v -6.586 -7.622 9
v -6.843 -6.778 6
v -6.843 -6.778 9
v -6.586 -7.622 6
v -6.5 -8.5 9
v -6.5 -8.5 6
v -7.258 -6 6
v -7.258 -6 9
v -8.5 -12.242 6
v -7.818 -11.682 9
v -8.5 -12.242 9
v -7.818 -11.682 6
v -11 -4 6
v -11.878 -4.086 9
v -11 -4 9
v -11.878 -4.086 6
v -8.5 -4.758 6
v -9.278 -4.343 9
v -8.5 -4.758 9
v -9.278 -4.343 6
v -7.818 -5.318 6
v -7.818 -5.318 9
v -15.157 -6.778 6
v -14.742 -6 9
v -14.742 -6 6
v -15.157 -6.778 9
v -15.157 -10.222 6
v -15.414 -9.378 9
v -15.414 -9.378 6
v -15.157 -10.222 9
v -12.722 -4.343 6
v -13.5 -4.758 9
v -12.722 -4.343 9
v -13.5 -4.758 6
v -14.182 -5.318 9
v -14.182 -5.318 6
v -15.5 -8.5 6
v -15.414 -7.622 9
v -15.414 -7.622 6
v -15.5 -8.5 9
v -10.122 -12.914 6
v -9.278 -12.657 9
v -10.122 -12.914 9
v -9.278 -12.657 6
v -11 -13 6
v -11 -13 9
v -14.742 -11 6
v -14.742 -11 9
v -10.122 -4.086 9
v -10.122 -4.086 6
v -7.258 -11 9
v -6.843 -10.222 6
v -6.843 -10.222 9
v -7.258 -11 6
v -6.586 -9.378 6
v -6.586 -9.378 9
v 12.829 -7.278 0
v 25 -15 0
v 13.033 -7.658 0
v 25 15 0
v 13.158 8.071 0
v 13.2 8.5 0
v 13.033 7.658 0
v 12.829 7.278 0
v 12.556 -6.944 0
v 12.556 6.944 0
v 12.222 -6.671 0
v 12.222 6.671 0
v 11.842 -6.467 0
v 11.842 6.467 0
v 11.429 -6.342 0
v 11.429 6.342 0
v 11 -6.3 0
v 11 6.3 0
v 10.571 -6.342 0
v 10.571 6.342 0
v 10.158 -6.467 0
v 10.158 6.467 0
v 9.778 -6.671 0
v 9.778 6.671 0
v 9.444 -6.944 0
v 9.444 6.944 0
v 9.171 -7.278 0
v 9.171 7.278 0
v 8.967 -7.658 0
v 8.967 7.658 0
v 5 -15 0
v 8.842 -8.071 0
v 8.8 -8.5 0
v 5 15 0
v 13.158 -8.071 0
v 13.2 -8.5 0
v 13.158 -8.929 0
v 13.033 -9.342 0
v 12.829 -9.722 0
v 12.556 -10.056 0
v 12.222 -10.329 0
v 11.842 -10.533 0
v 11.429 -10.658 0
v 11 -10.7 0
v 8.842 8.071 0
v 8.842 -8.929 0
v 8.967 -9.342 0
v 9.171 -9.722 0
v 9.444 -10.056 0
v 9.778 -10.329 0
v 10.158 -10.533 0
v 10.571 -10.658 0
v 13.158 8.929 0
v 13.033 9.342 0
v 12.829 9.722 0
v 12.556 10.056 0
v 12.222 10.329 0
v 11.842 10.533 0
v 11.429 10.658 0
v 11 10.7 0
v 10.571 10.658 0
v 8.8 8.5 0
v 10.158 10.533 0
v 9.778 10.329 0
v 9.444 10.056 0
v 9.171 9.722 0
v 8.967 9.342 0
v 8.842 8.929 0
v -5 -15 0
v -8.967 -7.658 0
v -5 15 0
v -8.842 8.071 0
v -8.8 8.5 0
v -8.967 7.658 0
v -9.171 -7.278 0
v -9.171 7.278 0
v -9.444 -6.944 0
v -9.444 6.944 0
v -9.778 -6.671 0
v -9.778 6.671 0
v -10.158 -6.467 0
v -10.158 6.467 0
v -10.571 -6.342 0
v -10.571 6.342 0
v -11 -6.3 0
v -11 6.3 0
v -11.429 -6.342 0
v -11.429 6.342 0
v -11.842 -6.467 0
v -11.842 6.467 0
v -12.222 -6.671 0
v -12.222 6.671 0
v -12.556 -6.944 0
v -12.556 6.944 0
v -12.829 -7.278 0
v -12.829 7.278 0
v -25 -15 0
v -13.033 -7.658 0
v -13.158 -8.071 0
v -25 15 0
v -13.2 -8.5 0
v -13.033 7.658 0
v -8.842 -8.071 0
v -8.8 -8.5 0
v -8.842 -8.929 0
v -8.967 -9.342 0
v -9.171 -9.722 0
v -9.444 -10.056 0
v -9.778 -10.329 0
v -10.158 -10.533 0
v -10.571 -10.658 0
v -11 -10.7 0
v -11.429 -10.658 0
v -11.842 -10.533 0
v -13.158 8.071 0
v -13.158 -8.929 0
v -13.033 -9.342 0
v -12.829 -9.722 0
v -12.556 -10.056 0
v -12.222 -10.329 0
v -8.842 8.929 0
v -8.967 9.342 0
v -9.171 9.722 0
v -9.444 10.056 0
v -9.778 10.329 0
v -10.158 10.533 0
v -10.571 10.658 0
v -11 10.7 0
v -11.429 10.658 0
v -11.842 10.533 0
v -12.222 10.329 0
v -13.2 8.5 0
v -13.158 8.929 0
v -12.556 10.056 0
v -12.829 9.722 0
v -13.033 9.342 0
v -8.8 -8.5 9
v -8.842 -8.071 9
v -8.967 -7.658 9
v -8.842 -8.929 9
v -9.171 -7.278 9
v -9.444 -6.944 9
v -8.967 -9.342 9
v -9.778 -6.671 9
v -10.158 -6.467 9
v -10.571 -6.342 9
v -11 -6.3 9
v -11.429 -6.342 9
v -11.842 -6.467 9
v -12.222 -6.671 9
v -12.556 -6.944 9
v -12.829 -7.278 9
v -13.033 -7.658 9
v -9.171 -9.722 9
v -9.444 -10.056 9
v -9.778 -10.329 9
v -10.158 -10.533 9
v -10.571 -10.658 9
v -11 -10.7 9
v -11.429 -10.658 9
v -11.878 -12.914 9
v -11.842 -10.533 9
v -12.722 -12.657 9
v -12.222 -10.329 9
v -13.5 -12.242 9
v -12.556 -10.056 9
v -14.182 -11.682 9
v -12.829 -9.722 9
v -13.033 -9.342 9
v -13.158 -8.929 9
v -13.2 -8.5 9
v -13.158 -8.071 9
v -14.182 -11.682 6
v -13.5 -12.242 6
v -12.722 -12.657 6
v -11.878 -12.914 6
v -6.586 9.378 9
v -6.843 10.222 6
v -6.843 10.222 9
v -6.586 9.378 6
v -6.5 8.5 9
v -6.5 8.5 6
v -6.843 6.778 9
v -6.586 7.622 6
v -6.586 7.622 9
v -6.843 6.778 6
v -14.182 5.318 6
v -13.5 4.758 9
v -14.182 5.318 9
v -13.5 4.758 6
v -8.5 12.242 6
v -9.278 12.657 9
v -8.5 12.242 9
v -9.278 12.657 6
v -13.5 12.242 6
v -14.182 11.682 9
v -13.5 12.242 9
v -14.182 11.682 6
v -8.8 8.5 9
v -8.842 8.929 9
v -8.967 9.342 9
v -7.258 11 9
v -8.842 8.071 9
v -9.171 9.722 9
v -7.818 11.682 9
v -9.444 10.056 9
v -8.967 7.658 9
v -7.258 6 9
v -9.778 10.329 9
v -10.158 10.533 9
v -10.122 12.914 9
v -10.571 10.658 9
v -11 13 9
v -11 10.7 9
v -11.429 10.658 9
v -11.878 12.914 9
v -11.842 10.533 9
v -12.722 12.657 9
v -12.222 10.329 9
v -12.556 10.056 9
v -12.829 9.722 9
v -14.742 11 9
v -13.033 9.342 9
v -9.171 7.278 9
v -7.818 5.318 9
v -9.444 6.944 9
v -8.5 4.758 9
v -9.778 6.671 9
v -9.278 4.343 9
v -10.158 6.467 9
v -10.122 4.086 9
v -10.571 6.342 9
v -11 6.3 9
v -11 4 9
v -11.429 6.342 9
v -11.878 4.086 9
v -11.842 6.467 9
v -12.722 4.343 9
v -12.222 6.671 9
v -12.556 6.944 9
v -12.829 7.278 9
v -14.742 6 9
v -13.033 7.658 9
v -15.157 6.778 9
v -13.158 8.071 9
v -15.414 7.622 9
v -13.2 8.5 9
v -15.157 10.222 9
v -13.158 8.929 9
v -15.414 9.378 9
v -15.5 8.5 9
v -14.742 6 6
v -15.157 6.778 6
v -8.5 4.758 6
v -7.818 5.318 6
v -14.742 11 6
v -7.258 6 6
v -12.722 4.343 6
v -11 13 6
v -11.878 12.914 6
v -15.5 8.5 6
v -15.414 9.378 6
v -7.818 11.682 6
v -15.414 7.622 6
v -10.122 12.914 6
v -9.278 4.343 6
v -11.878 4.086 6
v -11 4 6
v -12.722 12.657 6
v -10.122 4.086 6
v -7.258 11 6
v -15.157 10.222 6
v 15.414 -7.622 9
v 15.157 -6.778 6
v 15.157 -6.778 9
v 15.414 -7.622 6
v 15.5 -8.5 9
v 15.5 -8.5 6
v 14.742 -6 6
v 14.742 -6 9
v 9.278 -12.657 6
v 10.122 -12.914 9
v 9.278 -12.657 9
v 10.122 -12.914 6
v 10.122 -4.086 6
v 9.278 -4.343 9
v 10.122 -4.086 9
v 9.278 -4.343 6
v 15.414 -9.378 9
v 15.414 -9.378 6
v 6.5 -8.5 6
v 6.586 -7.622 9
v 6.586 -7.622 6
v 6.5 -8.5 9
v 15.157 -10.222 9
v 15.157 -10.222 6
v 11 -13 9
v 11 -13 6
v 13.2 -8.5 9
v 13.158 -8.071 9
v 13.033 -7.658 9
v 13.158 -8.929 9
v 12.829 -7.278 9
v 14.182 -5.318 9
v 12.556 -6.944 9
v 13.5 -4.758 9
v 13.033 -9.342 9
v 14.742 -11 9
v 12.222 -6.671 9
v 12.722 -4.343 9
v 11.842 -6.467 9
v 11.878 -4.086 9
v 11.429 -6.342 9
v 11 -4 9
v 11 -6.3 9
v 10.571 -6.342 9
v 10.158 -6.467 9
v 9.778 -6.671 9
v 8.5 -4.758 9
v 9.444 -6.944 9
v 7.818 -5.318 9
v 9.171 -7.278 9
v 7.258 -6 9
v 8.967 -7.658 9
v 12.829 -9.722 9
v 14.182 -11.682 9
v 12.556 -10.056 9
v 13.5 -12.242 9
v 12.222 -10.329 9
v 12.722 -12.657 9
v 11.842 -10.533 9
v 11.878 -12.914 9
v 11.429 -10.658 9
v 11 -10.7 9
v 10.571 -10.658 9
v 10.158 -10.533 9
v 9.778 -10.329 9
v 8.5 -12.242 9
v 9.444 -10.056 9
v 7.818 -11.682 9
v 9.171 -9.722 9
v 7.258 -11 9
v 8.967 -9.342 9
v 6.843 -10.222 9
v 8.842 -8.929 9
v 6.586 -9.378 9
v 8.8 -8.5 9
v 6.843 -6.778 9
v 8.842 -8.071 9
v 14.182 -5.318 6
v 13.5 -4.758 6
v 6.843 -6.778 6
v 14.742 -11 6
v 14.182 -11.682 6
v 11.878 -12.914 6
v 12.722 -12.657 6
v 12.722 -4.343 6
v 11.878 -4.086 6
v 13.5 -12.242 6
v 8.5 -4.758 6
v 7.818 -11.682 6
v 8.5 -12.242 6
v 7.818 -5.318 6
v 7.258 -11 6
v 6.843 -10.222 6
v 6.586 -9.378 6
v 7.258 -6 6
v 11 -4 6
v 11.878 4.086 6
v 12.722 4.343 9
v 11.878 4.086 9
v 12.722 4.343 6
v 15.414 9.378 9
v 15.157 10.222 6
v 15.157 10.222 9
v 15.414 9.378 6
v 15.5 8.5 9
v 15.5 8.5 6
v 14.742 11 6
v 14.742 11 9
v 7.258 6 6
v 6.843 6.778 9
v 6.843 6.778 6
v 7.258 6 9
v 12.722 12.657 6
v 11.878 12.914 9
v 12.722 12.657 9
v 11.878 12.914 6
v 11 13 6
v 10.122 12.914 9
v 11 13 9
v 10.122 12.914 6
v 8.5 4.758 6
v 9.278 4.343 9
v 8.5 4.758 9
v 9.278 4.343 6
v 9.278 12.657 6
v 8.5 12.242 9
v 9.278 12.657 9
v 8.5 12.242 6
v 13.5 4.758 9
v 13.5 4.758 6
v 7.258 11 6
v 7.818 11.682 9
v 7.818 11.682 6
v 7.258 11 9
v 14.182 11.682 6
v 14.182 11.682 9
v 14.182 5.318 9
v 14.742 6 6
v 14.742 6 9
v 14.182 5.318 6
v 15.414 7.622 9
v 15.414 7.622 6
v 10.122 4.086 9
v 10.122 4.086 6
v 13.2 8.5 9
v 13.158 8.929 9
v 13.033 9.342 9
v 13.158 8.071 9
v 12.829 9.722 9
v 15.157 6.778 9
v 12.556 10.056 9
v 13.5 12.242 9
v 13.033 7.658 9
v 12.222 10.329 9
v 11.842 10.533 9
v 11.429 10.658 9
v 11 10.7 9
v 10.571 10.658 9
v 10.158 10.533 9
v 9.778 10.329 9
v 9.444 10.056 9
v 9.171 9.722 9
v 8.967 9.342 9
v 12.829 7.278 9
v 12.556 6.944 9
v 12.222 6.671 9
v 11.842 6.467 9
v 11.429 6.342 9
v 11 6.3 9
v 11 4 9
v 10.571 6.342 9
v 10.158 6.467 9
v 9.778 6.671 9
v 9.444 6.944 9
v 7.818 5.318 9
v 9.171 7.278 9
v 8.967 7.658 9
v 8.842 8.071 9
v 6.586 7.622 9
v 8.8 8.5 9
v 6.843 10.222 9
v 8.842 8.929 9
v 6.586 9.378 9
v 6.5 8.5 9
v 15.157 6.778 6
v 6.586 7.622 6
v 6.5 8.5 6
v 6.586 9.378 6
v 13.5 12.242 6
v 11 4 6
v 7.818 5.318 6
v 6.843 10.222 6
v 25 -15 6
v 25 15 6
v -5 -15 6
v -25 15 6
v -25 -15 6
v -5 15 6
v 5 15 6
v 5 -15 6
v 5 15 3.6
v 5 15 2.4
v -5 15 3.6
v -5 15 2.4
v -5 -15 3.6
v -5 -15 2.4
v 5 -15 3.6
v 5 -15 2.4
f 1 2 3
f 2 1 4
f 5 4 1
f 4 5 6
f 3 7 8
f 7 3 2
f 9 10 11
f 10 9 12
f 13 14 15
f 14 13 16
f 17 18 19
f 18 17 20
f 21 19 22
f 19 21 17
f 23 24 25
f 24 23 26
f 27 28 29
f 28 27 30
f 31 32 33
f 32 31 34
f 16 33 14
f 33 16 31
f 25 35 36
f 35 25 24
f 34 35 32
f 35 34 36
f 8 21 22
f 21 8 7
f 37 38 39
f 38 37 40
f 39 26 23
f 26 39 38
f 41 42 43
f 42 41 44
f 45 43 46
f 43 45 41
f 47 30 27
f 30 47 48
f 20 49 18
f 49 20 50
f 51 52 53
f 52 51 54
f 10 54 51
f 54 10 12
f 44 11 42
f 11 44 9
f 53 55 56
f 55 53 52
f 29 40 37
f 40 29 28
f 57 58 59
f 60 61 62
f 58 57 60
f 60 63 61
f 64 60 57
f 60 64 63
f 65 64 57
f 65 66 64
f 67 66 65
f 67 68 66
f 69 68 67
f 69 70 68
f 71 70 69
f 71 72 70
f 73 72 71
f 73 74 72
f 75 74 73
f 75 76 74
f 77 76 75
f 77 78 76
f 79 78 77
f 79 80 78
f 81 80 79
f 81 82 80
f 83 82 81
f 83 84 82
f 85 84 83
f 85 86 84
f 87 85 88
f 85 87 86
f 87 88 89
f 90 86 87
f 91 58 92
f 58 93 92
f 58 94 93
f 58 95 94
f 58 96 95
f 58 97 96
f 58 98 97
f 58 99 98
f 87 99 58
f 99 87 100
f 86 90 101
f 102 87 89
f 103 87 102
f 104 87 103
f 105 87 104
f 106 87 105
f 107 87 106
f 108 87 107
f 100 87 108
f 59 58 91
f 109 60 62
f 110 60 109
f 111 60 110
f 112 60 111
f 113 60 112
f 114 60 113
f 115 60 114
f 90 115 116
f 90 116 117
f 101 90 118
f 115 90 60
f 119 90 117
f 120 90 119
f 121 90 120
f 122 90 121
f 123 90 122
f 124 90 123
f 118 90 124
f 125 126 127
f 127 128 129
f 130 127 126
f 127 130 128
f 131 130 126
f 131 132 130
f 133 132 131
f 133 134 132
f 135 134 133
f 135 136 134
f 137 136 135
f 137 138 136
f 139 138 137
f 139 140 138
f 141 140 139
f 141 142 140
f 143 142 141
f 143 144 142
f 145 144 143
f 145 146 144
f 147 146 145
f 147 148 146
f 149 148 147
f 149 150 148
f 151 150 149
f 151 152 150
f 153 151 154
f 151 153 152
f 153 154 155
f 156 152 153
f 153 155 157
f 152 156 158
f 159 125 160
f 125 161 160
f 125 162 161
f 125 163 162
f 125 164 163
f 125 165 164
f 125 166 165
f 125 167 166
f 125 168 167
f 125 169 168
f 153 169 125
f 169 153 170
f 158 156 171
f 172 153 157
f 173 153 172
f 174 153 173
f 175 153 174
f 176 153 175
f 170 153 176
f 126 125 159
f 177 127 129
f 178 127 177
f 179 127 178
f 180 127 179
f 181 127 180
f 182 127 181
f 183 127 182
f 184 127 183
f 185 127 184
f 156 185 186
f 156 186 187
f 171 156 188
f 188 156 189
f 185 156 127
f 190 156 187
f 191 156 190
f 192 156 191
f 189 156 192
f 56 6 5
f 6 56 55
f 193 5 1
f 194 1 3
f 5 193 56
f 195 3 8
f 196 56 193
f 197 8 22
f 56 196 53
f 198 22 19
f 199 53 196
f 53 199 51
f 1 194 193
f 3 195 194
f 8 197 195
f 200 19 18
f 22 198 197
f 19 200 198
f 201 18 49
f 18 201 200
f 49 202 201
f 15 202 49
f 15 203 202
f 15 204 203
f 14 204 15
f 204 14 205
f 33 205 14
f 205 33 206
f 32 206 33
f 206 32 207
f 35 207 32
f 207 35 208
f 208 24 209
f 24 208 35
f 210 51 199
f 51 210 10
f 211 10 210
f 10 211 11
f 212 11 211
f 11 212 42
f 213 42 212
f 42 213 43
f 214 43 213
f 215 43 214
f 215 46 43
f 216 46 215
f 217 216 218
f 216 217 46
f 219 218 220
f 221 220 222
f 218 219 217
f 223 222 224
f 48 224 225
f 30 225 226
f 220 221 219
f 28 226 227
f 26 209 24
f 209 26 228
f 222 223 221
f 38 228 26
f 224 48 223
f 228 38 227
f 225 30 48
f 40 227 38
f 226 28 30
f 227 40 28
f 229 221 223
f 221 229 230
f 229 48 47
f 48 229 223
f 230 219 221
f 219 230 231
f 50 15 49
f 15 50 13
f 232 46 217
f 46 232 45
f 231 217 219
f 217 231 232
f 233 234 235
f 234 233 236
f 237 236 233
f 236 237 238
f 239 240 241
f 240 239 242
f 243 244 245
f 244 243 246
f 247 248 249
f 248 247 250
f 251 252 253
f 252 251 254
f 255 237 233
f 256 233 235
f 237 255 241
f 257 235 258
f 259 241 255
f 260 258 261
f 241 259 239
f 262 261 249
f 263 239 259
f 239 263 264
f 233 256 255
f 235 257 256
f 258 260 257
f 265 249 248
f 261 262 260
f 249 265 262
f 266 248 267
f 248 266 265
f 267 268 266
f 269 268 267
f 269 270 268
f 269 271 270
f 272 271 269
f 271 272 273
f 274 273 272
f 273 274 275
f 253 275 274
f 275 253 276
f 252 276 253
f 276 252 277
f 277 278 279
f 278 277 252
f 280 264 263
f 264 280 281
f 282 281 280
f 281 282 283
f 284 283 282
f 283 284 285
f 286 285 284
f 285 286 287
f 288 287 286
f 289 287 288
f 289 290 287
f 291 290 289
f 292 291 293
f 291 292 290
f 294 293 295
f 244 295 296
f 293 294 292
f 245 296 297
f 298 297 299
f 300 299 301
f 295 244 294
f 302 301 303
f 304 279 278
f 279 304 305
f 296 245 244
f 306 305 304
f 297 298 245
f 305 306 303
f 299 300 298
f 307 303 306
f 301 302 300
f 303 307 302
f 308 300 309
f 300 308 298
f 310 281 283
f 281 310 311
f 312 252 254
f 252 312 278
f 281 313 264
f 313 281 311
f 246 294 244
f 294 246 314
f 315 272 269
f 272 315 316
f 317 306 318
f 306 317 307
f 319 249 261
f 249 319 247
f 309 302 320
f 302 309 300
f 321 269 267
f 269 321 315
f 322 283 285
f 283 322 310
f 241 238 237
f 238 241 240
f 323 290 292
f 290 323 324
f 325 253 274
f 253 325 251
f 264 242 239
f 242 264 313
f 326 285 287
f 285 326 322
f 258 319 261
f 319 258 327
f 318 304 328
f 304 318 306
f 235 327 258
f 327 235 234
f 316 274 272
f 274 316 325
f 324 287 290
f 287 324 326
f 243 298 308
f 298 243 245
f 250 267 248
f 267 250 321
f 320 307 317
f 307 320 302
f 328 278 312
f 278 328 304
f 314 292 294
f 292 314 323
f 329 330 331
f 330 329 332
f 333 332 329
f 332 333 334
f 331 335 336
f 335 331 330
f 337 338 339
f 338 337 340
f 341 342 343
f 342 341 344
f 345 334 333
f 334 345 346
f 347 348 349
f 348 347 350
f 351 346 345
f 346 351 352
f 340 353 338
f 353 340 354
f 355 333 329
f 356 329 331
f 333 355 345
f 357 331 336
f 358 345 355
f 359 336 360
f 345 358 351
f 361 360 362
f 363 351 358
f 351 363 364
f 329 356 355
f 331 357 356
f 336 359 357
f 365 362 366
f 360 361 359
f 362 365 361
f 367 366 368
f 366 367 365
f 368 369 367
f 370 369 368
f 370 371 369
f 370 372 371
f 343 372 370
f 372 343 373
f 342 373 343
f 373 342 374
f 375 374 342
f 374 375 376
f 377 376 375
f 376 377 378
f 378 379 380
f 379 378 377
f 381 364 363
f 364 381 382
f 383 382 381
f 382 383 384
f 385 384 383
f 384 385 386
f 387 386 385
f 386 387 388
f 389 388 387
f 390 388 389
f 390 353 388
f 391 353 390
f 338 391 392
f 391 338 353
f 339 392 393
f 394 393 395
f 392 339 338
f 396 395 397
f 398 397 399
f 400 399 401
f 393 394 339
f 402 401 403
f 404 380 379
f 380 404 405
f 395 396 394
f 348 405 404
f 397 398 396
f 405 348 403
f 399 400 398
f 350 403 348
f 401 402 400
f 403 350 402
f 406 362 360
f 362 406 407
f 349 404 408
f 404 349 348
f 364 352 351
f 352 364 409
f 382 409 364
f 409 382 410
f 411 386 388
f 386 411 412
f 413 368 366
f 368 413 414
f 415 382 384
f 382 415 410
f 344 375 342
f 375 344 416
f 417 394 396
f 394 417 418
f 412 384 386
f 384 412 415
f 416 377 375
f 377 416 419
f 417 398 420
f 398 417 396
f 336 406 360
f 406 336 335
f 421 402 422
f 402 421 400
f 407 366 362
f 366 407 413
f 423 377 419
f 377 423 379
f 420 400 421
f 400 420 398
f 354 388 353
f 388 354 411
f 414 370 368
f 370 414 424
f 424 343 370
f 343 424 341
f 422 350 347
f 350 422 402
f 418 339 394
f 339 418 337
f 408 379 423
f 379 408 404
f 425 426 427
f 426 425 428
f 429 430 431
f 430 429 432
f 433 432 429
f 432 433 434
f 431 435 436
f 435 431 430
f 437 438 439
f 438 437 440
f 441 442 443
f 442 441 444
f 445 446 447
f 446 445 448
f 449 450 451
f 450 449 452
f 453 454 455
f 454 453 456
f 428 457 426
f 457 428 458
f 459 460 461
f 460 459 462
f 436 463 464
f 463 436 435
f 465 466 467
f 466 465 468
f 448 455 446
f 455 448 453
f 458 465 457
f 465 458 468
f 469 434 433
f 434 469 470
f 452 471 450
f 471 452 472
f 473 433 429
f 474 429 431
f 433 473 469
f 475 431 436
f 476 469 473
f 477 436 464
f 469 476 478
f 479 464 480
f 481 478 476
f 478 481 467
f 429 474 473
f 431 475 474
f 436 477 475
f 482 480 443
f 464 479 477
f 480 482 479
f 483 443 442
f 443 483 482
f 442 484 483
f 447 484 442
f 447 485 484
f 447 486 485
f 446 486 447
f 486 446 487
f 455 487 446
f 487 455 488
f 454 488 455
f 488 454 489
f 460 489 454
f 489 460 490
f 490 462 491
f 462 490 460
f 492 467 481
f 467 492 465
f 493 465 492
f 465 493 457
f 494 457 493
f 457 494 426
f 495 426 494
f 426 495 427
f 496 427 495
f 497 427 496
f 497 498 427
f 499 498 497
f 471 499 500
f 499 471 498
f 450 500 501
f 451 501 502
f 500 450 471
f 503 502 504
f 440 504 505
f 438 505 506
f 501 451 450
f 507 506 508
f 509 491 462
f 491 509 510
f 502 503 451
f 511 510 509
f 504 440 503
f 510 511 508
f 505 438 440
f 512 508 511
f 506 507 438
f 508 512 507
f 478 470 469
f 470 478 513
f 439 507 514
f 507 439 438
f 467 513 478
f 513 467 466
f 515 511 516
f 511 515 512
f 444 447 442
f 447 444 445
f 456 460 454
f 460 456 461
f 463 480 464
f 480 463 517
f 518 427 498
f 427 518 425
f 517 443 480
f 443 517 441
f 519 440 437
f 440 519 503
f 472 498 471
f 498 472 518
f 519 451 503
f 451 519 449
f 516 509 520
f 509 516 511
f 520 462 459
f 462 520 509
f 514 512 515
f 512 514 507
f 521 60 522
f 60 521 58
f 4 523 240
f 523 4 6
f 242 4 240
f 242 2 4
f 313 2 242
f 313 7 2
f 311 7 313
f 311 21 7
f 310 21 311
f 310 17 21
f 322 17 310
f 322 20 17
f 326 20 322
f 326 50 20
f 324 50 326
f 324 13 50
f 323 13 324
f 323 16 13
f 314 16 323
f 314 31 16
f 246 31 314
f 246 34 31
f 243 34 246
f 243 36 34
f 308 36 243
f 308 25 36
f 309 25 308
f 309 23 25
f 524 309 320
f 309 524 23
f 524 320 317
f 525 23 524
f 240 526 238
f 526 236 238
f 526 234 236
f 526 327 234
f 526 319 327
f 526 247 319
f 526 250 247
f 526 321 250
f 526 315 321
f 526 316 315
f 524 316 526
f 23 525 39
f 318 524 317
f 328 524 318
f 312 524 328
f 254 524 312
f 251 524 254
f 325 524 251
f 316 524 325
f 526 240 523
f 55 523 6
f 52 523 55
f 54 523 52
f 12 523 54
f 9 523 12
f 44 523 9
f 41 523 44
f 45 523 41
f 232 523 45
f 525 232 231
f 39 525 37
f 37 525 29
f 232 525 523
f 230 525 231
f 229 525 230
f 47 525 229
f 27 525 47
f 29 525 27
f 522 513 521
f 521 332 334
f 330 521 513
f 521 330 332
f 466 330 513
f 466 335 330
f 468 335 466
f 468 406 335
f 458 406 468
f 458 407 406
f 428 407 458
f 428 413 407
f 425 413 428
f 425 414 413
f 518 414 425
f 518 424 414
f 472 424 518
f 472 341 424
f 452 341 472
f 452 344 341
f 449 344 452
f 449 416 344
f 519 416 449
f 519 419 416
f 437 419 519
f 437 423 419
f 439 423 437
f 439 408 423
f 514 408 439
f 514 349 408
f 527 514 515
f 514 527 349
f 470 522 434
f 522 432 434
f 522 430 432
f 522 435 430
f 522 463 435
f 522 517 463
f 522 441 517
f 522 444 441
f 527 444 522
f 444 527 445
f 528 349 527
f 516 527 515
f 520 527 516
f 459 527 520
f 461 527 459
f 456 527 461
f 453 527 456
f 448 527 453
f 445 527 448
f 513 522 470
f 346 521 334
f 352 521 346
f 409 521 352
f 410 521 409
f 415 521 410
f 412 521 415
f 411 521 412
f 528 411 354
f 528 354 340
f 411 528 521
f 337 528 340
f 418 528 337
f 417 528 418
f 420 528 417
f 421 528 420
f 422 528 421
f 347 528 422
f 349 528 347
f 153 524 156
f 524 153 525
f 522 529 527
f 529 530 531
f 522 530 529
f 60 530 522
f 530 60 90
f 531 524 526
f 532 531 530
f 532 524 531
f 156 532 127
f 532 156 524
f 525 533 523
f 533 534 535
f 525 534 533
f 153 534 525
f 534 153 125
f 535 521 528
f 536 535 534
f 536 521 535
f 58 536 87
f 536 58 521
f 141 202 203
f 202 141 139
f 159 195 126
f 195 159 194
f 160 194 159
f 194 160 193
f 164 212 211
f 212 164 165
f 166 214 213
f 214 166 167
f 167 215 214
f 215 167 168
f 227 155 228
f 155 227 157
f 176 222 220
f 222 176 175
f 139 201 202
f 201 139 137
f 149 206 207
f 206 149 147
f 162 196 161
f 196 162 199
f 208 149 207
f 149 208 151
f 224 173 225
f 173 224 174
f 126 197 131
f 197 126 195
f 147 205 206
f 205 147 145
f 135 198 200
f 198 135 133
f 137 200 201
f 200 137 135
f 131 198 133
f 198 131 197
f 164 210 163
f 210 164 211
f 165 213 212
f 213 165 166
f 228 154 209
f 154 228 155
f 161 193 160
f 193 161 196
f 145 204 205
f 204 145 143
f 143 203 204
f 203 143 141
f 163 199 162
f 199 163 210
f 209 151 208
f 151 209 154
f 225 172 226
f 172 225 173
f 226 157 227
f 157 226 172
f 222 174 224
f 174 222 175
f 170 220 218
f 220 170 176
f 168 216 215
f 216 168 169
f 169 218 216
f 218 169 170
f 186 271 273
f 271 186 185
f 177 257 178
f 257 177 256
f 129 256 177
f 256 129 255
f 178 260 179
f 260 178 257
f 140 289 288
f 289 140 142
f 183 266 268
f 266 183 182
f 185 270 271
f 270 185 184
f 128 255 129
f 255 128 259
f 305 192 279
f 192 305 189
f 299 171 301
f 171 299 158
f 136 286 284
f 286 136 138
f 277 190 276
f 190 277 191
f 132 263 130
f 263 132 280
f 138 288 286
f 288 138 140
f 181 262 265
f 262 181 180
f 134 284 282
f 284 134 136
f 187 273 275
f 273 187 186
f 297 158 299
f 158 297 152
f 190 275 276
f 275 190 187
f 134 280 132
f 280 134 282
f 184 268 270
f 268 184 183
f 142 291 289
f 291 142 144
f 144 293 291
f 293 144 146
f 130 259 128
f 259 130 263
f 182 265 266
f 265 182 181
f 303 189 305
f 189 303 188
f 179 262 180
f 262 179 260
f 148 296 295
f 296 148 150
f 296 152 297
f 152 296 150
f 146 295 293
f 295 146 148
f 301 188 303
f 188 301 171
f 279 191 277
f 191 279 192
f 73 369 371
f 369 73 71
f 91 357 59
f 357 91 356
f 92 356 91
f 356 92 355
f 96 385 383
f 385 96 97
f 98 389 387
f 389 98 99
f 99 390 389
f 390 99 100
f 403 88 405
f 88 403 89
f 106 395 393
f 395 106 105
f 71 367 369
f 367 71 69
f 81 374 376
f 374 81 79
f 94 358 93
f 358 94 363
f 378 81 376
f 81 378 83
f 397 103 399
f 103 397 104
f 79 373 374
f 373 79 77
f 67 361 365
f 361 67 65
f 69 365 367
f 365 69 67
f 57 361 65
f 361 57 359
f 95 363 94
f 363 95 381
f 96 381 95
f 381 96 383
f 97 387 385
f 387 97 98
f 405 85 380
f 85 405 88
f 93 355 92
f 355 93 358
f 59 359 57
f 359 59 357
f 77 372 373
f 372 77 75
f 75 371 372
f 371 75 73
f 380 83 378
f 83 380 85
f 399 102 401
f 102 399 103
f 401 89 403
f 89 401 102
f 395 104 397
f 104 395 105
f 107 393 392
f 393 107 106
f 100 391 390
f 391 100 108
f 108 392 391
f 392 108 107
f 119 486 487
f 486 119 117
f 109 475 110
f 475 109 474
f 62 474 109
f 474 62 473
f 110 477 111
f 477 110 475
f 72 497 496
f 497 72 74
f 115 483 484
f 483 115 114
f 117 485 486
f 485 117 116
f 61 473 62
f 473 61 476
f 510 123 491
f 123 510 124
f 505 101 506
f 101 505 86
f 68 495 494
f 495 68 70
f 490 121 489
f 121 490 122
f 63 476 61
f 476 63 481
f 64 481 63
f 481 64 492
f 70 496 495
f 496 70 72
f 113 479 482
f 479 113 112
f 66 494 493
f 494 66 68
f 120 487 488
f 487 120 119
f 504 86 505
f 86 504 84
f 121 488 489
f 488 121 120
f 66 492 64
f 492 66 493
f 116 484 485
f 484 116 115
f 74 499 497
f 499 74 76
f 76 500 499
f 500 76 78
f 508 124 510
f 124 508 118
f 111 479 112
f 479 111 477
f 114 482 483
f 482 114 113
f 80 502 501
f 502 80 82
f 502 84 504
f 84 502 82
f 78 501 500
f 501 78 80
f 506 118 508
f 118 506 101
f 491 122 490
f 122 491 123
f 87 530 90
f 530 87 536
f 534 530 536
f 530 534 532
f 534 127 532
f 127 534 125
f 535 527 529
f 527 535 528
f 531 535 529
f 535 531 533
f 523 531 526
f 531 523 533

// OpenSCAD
$fn = 32;

// ----------------------------------------------------------------------
// Living hinge: 50 x 30 mm plates, 1.2 mm flexible web
// ----------------------------------------------------------------------

// --- parameters (mm) ---
plate_len = 20;           // plate length outside the web
plate_w = 30;             // plate width
thick = 6;                // plate thickness
web_half = 5;             // half width of the flex band
web_t = 1.2;              // flexible web thickness
web_z = 2.4;              // web position inside the thickness
boss_d = 9;               // screw boss diameter
boss_h = 9;               // screw boss height
boss_x = 11;              // screw boss distance from the web
screw_d = 4.4;            // screw hole

difference() {
  union() {
    /* one flat strip, later thinned at the middle */
    translate([-25, -15, 0]) cube([50, 30, 6]);
    /* screw bosses, sunk 0.5 mm into the plates */
    for (sx = [-11, 11]) {
      for (sy = [-8.5, 8.5]) {
        translate([sx, sy, 0]) cylinder(h = boss_h, d = boss_d);
      }
    }
  }
  /* channel from below: leaves the web on top of it */
  translate([-5, -17.5, -2.5]) cube([10, 35, 4.9]);
  /* channel from above: thins the web down to web_t */
  translate([-5, -17.5, 3.6]) cube([10, 35, 4.9]);
  /* screw holes through the bosses */
  for (sx = [-11, 11]) {
    for (sy = [-8.5, 8.5]) {
      translate([sx, sy, -2.5]) cylinder(h = boss_h + 5, d = screw_d);
    }
  }
}
